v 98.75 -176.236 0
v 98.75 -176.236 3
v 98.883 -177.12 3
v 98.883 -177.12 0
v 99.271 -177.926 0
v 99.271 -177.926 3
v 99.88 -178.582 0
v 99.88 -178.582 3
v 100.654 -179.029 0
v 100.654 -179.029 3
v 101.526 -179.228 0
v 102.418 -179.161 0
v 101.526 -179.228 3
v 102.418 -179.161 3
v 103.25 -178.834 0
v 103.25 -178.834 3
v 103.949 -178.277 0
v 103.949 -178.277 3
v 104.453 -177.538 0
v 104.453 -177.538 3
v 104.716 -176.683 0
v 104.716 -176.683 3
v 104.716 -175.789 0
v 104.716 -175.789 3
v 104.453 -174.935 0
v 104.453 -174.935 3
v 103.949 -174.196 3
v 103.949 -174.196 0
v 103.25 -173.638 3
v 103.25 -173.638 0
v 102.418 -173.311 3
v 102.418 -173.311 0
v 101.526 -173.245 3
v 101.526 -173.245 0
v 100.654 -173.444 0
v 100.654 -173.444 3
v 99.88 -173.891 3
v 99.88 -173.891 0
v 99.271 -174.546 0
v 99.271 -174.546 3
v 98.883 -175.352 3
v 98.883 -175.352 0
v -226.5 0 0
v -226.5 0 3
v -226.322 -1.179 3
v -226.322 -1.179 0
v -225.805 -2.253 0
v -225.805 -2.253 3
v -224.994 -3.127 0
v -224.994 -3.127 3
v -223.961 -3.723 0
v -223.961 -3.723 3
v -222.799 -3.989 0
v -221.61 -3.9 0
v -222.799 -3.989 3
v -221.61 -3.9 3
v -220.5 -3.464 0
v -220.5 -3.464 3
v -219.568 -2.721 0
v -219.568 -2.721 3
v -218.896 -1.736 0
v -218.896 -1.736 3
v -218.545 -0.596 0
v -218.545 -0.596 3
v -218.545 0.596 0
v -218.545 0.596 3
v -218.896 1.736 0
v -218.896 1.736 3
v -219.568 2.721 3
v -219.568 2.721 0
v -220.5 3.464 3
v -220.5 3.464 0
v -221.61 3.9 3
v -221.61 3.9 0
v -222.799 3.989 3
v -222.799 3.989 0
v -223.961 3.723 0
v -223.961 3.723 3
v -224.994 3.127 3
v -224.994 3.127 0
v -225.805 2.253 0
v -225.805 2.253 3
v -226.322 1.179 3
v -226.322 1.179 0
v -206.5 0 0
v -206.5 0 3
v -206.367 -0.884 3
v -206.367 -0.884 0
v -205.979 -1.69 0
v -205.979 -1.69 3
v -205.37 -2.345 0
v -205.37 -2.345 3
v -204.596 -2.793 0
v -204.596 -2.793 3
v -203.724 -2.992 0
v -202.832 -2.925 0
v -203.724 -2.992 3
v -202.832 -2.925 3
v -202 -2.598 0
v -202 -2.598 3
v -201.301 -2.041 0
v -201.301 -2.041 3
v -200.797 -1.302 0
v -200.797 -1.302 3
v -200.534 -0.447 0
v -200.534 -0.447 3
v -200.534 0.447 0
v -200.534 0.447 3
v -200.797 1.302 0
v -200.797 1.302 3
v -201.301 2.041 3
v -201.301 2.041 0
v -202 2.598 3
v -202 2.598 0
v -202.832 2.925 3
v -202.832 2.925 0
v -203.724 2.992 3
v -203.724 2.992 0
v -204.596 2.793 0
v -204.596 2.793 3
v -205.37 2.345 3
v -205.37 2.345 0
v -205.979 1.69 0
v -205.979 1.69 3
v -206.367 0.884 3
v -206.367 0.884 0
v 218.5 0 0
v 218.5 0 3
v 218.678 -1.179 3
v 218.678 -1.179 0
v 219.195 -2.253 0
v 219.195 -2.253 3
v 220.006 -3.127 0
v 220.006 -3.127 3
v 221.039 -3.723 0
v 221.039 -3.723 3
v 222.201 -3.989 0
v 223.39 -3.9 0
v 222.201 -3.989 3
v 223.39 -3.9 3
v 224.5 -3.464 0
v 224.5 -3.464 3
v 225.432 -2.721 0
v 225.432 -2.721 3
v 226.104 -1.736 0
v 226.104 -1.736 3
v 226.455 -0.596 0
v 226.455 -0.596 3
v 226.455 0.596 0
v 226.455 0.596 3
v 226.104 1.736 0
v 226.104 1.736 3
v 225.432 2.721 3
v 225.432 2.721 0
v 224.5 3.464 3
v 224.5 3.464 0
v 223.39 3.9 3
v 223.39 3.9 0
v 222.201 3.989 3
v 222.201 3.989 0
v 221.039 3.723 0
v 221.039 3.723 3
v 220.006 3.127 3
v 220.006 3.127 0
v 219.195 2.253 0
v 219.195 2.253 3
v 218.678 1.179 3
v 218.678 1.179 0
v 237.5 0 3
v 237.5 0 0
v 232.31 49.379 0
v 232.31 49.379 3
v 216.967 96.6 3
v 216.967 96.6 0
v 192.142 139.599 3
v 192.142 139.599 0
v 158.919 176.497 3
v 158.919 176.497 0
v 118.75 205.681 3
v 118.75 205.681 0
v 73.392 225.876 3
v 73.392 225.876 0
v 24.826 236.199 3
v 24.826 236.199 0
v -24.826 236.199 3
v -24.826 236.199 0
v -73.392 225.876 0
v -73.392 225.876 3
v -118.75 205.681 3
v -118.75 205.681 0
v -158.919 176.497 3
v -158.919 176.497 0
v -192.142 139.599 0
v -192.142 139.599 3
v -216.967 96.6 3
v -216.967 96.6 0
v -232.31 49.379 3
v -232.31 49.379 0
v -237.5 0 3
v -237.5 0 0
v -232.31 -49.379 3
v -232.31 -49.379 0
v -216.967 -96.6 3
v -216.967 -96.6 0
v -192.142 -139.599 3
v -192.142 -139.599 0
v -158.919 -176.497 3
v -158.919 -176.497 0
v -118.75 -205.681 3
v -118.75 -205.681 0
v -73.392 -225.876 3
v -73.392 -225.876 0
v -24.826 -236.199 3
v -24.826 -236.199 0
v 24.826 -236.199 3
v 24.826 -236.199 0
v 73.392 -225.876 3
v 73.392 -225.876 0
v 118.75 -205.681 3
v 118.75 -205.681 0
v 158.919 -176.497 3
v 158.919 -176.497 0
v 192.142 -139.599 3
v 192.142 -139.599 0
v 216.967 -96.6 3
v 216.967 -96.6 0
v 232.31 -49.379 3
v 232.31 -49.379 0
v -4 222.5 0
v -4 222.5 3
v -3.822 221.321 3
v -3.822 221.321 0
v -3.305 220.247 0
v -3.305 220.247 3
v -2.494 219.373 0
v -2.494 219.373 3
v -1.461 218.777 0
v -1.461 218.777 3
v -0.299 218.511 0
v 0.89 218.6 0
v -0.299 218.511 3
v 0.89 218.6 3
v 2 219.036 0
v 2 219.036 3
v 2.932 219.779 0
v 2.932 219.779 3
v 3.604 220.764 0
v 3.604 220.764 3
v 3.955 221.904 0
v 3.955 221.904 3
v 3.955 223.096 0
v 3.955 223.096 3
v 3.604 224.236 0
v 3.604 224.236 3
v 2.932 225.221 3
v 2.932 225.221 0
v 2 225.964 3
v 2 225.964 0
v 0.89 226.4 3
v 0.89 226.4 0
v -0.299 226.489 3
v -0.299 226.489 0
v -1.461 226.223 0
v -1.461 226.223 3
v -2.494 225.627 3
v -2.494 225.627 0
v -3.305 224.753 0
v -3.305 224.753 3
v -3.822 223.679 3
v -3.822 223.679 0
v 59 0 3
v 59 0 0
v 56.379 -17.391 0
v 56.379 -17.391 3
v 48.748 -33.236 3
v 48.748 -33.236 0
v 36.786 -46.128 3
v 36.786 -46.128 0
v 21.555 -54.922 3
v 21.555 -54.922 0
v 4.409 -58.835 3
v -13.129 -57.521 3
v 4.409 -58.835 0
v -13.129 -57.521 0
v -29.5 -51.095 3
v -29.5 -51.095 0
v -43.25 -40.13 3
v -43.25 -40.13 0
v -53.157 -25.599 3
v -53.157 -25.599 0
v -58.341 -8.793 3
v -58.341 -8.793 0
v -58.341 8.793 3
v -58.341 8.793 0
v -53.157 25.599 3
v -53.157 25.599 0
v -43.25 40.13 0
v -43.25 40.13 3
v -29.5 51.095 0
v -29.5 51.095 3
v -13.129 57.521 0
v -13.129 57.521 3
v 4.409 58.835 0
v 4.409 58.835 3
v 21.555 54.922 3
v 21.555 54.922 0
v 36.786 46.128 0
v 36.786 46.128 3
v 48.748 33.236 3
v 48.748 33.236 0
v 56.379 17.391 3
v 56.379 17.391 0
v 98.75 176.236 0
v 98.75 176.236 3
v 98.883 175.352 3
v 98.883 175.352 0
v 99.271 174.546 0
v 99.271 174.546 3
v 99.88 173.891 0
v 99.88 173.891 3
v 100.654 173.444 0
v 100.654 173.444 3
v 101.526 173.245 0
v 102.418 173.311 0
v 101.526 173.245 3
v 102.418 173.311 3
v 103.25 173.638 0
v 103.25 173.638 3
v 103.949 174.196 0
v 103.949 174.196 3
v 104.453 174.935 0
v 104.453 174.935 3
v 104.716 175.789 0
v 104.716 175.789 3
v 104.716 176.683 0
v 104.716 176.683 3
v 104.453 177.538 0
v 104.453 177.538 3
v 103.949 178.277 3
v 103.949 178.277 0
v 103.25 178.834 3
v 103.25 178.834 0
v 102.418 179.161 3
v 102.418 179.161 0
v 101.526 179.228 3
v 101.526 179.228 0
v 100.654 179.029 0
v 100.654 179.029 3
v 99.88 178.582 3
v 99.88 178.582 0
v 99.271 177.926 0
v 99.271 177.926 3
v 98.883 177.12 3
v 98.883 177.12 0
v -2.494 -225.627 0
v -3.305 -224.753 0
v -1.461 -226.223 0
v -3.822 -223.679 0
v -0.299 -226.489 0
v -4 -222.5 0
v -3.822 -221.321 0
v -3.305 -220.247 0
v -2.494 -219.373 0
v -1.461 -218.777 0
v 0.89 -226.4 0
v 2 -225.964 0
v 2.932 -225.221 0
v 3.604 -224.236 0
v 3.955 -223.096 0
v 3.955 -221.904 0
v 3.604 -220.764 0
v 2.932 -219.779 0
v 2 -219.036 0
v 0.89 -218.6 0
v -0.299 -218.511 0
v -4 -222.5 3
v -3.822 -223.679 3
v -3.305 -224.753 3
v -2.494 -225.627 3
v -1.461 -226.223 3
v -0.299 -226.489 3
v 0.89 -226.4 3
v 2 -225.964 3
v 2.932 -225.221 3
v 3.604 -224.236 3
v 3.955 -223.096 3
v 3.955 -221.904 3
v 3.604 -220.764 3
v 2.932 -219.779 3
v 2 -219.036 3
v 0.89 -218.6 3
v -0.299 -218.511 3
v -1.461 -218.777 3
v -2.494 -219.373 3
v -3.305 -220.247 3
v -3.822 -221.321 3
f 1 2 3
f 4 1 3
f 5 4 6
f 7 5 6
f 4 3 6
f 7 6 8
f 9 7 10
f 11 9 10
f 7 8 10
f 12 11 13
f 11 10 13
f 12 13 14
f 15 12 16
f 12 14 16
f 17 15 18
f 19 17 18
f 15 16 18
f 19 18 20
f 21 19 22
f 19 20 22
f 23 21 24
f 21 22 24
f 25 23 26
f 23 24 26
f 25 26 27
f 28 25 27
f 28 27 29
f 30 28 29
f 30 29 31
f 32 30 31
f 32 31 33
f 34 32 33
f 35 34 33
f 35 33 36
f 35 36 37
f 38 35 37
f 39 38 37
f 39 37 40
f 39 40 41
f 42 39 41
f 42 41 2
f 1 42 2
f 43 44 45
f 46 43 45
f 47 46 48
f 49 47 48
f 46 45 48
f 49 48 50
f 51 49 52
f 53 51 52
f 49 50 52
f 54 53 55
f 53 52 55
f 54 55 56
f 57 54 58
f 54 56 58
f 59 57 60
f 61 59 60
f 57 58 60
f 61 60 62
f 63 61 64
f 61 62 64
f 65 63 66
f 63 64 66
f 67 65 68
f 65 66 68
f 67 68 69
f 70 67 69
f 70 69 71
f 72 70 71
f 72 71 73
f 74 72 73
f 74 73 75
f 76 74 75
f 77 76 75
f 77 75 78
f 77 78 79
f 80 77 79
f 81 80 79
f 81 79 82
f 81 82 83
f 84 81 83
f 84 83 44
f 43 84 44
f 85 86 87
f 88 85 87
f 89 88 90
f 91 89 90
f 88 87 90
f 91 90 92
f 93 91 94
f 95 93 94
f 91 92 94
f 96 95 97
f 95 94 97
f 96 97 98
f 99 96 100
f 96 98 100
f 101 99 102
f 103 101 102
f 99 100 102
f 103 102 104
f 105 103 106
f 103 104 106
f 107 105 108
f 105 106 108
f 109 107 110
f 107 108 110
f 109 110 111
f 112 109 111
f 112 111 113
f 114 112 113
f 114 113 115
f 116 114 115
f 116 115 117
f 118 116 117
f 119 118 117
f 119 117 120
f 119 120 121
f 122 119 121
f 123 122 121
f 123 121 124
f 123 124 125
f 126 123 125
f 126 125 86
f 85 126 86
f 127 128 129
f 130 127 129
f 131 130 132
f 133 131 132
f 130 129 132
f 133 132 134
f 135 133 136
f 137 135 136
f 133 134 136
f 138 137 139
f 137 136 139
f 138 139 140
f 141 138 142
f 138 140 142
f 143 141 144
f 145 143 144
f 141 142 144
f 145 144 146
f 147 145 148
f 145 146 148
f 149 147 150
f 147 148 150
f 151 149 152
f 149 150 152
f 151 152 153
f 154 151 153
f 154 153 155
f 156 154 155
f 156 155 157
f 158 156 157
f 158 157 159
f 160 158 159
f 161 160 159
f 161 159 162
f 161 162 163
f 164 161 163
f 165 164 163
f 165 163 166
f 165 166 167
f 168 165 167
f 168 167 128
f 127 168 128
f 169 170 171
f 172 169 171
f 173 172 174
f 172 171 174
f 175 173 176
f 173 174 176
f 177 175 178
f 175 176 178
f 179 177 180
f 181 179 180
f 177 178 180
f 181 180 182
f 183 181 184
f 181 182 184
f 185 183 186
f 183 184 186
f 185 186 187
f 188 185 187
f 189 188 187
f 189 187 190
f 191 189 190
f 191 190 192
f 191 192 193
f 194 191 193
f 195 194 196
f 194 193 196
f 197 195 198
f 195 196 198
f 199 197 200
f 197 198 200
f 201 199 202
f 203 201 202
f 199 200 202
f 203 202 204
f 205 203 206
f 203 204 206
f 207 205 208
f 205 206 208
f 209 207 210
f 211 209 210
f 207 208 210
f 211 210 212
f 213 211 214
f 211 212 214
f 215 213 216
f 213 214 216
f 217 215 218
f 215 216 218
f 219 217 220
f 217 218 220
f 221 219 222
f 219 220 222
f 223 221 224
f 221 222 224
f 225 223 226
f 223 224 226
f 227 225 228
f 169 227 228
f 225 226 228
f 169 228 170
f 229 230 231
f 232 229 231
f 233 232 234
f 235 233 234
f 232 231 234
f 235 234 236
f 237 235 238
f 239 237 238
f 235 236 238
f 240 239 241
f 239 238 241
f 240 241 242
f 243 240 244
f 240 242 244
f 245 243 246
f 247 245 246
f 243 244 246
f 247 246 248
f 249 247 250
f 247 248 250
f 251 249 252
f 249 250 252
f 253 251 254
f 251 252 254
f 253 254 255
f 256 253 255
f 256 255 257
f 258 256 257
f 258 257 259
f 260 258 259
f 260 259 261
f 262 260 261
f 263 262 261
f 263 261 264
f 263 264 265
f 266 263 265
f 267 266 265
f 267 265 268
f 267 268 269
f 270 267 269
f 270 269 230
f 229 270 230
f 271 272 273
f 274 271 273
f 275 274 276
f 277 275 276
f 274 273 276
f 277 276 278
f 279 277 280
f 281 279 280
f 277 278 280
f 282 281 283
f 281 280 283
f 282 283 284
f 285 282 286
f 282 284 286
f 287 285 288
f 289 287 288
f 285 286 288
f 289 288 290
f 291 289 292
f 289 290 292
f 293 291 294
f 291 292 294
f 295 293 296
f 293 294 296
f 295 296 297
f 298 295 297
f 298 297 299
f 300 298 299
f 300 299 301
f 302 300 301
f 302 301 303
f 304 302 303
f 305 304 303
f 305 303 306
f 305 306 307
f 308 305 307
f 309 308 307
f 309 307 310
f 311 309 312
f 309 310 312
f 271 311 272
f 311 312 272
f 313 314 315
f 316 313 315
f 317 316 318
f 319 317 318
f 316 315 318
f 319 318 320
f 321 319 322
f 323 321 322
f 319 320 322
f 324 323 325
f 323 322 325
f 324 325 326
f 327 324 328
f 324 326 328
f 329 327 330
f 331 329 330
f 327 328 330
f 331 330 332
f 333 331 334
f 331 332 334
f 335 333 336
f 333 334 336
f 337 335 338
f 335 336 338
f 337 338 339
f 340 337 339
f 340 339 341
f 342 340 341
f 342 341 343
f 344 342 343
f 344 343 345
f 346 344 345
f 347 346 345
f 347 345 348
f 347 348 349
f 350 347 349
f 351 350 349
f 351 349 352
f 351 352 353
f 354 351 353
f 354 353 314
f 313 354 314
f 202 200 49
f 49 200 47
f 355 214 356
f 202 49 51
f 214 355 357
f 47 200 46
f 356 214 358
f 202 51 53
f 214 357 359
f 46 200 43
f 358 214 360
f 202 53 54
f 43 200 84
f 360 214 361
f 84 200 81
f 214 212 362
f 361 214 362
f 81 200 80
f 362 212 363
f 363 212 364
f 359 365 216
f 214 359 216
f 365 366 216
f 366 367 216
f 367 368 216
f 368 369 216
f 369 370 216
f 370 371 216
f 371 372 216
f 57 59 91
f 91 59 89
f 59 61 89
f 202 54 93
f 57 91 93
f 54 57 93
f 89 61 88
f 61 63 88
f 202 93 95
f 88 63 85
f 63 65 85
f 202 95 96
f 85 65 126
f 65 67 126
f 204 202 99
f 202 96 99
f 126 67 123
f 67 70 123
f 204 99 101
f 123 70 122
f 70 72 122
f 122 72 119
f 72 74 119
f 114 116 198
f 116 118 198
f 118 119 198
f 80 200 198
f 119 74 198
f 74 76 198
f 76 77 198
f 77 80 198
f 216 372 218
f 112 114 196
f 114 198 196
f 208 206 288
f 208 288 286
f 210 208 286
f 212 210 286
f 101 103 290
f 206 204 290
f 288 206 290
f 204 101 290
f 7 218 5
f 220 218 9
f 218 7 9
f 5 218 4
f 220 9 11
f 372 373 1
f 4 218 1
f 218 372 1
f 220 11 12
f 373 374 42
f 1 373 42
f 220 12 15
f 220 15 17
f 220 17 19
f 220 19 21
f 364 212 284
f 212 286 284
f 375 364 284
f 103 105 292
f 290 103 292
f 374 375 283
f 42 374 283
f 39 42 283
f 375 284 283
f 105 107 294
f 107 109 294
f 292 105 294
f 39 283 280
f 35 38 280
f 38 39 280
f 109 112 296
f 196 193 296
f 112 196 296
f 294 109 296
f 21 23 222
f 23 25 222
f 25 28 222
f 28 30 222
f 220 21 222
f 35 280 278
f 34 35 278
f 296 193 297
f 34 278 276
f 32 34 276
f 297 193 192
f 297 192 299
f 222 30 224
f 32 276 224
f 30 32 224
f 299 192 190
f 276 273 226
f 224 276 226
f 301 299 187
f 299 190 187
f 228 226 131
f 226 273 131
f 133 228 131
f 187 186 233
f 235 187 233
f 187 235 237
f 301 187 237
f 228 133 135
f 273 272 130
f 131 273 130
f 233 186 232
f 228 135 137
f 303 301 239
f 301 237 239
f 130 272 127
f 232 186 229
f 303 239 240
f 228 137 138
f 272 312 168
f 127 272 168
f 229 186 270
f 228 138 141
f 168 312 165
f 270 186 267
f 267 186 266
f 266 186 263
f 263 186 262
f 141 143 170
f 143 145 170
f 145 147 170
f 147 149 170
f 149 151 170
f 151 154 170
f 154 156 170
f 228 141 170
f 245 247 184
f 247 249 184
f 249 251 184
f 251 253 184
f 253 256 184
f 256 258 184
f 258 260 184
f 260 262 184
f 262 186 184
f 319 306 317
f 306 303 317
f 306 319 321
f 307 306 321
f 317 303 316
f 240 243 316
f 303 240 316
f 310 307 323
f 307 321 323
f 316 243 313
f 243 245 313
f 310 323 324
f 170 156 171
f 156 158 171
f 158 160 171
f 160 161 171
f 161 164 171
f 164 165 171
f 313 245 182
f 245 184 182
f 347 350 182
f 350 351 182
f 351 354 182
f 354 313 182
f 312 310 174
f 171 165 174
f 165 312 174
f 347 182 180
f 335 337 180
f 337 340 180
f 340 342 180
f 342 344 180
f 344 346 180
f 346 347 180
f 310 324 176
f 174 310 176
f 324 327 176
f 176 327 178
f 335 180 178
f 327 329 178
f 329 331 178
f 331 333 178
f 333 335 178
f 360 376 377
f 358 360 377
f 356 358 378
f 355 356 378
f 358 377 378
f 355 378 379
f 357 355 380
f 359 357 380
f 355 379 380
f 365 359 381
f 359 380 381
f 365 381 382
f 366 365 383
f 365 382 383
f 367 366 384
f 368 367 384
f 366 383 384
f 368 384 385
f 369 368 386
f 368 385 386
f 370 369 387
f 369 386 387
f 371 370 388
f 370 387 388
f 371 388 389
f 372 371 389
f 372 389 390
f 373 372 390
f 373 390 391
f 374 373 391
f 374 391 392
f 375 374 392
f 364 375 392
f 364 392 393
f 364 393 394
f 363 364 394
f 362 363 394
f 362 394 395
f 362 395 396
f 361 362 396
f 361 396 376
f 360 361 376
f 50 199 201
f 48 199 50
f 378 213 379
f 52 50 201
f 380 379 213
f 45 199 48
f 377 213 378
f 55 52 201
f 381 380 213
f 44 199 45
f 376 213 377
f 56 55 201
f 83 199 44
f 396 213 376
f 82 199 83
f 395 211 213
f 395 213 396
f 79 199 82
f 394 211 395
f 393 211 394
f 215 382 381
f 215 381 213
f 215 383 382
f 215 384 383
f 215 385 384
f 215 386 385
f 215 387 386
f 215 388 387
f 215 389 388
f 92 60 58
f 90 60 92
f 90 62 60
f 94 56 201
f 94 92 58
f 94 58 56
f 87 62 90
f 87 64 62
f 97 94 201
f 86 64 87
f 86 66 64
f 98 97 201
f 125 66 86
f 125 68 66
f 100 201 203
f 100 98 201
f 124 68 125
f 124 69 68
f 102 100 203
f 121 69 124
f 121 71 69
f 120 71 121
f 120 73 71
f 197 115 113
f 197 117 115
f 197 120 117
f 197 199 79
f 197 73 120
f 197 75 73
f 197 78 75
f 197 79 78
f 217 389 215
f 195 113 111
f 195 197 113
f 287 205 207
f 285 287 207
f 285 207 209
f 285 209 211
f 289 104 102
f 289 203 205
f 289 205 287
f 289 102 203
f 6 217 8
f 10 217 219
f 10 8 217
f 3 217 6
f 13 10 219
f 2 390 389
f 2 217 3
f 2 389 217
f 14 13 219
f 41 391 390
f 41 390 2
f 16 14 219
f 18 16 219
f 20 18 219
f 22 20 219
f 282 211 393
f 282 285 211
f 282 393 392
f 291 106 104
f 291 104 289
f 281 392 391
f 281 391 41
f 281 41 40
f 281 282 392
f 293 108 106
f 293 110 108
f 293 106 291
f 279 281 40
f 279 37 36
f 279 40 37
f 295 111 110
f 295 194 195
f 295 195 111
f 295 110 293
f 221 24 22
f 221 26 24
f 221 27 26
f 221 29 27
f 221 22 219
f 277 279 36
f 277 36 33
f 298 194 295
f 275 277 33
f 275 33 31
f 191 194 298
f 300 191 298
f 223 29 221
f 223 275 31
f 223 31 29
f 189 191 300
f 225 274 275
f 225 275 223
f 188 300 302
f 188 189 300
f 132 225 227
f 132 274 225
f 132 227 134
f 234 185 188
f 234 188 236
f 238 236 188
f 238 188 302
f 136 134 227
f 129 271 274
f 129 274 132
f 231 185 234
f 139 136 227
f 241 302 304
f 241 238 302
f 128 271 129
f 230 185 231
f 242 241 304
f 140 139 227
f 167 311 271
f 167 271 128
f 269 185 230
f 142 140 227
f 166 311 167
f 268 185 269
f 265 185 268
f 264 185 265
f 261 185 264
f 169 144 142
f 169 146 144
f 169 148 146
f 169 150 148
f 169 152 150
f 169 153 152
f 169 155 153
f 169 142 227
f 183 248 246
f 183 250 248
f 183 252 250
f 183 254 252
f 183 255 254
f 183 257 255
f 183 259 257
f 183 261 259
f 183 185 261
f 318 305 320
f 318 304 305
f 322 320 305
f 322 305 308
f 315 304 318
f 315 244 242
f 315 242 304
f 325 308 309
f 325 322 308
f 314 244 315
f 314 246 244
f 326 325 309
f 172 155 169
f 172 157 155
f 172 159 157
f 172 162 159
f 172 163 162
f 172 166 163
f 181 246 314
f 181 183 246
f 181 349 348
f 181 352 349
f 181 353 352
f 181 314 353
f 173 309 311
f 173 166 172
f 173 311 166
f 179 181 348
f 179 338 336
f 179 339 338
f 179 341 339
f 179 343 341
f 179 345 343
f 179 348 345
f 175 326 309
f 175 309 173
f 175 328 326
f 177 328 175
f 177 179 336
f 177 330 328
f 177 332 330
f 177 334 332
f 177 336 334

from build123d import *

# Parameters (mm, degrees)
F0_R     = 237.5
F1_DEPTH = 3
F2_D     = 8
F3_D     = 6


with BuildPart() as f1:
    # F0 (on Top) → F1 (new body)
    with BuildSketch(Plane.XY):
        with BuildLine():
            ThreePointArc((-59, 0), (0, -59), (59, 0))
            ThreePointArc((59, 0), (0, 59), (-59, 0))
        make_face()
        Circle(F0_R)
        with BuildLine():
            ThreePointArc((-59, 0), (0, 59), (59, 0))
            ThreePointArc((59, 0), (0, -59), (-59, 0))
        make_face(mode=Mode.SUBTRACT)
    extrude(amount=F1_DEPTH)

    # F2 (through all)
    with Locations(Plane(origin=(0, 0, 0), x_dir=(1, 0, 0), z_dir=(0, 0, -1))):
        with Locations((222.5, 0), (0, 222.5), (-222.5, 0), (0, -222.5)):
            Hole(F2_D / 2)

    # F3 (through all)
    with Locations(Plane(origin=(0, 0, 0), x_dir=(1, 0, 0), z_dir=(0, 0, -1))):
        with Locations((-203.5, 0), (101.75, 176.23617), (101.75, -176.23617)):
            Hole(F3_D / 2)


solid = f1.part
